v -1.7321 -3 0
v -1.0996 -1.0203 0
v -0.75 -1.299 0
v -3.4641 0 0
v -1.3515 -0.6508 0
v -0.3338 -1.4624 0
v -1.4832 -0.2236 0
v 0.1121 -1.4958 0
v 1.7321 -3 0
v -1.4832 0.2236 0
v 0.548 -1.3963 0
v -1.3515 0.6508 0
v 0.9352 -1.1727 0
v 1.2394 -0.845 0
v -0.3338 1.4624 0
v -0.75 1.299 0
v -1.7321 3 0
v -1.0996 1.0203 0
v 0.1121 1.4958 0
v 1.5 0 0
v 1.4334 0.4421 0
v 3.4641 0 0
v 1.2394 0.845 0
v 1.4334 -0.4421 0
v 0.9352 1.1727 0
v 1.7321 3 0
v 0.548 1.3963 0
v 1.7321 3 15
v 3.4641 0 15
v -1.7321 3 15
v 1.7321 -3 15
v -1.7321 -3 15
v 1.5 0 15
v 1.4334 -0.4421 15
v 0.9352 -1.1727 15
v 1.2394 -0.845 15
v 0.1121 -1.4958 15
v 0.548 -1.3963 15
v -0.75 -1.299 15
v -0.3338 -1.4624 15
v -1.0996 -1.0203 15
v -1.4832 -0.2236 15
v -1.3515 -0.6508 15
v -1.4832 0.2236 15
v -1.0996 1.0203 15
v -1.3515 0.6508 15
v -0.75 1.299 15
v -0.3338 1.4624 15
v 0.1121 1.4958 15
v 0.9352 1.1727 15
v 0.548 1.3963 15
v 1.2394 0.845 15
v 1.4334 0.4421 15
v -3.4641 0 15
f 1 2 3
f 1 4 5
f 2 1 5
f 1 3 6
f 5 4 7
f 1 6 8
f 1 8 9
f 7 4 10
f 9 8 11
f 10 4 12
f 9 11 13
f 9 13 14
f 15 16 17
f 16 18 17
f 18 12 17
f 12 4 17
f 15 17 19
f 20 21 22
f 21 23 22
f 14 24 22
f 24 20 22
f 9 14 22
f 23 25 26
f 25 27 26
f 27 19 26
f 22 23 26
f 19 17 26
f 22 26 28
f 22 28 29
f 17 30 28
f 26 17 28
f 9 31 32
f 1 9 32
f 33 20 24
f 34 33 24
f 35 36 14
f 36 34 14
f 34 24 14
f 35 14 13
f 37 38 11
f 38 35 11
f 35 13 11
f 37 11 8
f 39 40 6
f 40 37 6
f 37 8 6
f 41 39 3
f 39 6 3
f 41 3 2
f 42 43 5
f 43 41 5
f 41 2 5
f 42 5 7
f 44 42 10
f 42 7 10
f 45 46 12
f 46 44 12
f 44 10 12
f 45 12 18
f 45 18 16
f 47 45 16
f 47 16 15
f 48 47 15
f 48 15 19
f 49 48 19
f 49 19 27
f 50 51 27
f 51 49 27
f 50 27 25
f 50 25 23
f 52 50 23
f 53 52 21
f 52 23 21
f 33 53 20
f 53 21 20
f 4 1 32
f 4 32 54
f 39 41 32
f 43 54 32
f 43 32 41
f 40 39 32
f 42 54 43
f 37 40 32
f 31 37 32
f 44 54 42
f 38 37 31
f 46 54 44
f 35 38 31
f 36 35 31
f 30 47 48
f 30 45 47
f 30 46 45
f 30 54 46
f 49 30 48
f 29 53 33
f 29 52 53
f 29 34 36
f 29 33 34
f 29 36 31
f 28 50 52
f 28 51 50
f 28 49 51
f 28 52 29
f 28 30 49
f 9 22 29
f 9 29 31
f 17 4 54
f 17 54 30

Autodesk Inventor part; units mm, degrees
ref_plane "YZ Plane" through (0, 0, 0) normal (1, 0, 0) x (0, 1, 0)
ref_plane "XZ Plane" through (0, 0, 0) normal (0, 1, 0) x (-1, 0, 0)
ref_plane "XY Plane" through (0, 0, 0) normal (0, 0, 1) x (1, 0, 0)
sketch "Sketch2" plane through (0, 0, 0) normal (0, 0, 1) x (1, 0, 0)
  line L0 (-1.7321, 3) -> (1.7321, 3)
  line L1 (1.7321, 3) -> (3.4641, 0)
  line L2 (3.4641, 0) -> (1.7321, -3)
  line L3 (1.7321, -3) -> (-1.7321, -3)
  line L4 (-1.7321, -3) -> (-3.4641, 0)
  line L5 (-3.4641, 0) -> (-1.7321, 3)
  line L6 (-4.8497, 0) -> (4.8497, 0) construction
  circle A0 centre (0, 0) radius 1.5
  dimension "d0" = 6
  dimension "d3" = 3
extrude "Extrusion1" add sketch "Sketch2" along normal blind 15
thread "Thread1" size "M3x0.5" class "6H" standard "ISO Metric profile" full length
properties part number "P043_entretoise15par3"
